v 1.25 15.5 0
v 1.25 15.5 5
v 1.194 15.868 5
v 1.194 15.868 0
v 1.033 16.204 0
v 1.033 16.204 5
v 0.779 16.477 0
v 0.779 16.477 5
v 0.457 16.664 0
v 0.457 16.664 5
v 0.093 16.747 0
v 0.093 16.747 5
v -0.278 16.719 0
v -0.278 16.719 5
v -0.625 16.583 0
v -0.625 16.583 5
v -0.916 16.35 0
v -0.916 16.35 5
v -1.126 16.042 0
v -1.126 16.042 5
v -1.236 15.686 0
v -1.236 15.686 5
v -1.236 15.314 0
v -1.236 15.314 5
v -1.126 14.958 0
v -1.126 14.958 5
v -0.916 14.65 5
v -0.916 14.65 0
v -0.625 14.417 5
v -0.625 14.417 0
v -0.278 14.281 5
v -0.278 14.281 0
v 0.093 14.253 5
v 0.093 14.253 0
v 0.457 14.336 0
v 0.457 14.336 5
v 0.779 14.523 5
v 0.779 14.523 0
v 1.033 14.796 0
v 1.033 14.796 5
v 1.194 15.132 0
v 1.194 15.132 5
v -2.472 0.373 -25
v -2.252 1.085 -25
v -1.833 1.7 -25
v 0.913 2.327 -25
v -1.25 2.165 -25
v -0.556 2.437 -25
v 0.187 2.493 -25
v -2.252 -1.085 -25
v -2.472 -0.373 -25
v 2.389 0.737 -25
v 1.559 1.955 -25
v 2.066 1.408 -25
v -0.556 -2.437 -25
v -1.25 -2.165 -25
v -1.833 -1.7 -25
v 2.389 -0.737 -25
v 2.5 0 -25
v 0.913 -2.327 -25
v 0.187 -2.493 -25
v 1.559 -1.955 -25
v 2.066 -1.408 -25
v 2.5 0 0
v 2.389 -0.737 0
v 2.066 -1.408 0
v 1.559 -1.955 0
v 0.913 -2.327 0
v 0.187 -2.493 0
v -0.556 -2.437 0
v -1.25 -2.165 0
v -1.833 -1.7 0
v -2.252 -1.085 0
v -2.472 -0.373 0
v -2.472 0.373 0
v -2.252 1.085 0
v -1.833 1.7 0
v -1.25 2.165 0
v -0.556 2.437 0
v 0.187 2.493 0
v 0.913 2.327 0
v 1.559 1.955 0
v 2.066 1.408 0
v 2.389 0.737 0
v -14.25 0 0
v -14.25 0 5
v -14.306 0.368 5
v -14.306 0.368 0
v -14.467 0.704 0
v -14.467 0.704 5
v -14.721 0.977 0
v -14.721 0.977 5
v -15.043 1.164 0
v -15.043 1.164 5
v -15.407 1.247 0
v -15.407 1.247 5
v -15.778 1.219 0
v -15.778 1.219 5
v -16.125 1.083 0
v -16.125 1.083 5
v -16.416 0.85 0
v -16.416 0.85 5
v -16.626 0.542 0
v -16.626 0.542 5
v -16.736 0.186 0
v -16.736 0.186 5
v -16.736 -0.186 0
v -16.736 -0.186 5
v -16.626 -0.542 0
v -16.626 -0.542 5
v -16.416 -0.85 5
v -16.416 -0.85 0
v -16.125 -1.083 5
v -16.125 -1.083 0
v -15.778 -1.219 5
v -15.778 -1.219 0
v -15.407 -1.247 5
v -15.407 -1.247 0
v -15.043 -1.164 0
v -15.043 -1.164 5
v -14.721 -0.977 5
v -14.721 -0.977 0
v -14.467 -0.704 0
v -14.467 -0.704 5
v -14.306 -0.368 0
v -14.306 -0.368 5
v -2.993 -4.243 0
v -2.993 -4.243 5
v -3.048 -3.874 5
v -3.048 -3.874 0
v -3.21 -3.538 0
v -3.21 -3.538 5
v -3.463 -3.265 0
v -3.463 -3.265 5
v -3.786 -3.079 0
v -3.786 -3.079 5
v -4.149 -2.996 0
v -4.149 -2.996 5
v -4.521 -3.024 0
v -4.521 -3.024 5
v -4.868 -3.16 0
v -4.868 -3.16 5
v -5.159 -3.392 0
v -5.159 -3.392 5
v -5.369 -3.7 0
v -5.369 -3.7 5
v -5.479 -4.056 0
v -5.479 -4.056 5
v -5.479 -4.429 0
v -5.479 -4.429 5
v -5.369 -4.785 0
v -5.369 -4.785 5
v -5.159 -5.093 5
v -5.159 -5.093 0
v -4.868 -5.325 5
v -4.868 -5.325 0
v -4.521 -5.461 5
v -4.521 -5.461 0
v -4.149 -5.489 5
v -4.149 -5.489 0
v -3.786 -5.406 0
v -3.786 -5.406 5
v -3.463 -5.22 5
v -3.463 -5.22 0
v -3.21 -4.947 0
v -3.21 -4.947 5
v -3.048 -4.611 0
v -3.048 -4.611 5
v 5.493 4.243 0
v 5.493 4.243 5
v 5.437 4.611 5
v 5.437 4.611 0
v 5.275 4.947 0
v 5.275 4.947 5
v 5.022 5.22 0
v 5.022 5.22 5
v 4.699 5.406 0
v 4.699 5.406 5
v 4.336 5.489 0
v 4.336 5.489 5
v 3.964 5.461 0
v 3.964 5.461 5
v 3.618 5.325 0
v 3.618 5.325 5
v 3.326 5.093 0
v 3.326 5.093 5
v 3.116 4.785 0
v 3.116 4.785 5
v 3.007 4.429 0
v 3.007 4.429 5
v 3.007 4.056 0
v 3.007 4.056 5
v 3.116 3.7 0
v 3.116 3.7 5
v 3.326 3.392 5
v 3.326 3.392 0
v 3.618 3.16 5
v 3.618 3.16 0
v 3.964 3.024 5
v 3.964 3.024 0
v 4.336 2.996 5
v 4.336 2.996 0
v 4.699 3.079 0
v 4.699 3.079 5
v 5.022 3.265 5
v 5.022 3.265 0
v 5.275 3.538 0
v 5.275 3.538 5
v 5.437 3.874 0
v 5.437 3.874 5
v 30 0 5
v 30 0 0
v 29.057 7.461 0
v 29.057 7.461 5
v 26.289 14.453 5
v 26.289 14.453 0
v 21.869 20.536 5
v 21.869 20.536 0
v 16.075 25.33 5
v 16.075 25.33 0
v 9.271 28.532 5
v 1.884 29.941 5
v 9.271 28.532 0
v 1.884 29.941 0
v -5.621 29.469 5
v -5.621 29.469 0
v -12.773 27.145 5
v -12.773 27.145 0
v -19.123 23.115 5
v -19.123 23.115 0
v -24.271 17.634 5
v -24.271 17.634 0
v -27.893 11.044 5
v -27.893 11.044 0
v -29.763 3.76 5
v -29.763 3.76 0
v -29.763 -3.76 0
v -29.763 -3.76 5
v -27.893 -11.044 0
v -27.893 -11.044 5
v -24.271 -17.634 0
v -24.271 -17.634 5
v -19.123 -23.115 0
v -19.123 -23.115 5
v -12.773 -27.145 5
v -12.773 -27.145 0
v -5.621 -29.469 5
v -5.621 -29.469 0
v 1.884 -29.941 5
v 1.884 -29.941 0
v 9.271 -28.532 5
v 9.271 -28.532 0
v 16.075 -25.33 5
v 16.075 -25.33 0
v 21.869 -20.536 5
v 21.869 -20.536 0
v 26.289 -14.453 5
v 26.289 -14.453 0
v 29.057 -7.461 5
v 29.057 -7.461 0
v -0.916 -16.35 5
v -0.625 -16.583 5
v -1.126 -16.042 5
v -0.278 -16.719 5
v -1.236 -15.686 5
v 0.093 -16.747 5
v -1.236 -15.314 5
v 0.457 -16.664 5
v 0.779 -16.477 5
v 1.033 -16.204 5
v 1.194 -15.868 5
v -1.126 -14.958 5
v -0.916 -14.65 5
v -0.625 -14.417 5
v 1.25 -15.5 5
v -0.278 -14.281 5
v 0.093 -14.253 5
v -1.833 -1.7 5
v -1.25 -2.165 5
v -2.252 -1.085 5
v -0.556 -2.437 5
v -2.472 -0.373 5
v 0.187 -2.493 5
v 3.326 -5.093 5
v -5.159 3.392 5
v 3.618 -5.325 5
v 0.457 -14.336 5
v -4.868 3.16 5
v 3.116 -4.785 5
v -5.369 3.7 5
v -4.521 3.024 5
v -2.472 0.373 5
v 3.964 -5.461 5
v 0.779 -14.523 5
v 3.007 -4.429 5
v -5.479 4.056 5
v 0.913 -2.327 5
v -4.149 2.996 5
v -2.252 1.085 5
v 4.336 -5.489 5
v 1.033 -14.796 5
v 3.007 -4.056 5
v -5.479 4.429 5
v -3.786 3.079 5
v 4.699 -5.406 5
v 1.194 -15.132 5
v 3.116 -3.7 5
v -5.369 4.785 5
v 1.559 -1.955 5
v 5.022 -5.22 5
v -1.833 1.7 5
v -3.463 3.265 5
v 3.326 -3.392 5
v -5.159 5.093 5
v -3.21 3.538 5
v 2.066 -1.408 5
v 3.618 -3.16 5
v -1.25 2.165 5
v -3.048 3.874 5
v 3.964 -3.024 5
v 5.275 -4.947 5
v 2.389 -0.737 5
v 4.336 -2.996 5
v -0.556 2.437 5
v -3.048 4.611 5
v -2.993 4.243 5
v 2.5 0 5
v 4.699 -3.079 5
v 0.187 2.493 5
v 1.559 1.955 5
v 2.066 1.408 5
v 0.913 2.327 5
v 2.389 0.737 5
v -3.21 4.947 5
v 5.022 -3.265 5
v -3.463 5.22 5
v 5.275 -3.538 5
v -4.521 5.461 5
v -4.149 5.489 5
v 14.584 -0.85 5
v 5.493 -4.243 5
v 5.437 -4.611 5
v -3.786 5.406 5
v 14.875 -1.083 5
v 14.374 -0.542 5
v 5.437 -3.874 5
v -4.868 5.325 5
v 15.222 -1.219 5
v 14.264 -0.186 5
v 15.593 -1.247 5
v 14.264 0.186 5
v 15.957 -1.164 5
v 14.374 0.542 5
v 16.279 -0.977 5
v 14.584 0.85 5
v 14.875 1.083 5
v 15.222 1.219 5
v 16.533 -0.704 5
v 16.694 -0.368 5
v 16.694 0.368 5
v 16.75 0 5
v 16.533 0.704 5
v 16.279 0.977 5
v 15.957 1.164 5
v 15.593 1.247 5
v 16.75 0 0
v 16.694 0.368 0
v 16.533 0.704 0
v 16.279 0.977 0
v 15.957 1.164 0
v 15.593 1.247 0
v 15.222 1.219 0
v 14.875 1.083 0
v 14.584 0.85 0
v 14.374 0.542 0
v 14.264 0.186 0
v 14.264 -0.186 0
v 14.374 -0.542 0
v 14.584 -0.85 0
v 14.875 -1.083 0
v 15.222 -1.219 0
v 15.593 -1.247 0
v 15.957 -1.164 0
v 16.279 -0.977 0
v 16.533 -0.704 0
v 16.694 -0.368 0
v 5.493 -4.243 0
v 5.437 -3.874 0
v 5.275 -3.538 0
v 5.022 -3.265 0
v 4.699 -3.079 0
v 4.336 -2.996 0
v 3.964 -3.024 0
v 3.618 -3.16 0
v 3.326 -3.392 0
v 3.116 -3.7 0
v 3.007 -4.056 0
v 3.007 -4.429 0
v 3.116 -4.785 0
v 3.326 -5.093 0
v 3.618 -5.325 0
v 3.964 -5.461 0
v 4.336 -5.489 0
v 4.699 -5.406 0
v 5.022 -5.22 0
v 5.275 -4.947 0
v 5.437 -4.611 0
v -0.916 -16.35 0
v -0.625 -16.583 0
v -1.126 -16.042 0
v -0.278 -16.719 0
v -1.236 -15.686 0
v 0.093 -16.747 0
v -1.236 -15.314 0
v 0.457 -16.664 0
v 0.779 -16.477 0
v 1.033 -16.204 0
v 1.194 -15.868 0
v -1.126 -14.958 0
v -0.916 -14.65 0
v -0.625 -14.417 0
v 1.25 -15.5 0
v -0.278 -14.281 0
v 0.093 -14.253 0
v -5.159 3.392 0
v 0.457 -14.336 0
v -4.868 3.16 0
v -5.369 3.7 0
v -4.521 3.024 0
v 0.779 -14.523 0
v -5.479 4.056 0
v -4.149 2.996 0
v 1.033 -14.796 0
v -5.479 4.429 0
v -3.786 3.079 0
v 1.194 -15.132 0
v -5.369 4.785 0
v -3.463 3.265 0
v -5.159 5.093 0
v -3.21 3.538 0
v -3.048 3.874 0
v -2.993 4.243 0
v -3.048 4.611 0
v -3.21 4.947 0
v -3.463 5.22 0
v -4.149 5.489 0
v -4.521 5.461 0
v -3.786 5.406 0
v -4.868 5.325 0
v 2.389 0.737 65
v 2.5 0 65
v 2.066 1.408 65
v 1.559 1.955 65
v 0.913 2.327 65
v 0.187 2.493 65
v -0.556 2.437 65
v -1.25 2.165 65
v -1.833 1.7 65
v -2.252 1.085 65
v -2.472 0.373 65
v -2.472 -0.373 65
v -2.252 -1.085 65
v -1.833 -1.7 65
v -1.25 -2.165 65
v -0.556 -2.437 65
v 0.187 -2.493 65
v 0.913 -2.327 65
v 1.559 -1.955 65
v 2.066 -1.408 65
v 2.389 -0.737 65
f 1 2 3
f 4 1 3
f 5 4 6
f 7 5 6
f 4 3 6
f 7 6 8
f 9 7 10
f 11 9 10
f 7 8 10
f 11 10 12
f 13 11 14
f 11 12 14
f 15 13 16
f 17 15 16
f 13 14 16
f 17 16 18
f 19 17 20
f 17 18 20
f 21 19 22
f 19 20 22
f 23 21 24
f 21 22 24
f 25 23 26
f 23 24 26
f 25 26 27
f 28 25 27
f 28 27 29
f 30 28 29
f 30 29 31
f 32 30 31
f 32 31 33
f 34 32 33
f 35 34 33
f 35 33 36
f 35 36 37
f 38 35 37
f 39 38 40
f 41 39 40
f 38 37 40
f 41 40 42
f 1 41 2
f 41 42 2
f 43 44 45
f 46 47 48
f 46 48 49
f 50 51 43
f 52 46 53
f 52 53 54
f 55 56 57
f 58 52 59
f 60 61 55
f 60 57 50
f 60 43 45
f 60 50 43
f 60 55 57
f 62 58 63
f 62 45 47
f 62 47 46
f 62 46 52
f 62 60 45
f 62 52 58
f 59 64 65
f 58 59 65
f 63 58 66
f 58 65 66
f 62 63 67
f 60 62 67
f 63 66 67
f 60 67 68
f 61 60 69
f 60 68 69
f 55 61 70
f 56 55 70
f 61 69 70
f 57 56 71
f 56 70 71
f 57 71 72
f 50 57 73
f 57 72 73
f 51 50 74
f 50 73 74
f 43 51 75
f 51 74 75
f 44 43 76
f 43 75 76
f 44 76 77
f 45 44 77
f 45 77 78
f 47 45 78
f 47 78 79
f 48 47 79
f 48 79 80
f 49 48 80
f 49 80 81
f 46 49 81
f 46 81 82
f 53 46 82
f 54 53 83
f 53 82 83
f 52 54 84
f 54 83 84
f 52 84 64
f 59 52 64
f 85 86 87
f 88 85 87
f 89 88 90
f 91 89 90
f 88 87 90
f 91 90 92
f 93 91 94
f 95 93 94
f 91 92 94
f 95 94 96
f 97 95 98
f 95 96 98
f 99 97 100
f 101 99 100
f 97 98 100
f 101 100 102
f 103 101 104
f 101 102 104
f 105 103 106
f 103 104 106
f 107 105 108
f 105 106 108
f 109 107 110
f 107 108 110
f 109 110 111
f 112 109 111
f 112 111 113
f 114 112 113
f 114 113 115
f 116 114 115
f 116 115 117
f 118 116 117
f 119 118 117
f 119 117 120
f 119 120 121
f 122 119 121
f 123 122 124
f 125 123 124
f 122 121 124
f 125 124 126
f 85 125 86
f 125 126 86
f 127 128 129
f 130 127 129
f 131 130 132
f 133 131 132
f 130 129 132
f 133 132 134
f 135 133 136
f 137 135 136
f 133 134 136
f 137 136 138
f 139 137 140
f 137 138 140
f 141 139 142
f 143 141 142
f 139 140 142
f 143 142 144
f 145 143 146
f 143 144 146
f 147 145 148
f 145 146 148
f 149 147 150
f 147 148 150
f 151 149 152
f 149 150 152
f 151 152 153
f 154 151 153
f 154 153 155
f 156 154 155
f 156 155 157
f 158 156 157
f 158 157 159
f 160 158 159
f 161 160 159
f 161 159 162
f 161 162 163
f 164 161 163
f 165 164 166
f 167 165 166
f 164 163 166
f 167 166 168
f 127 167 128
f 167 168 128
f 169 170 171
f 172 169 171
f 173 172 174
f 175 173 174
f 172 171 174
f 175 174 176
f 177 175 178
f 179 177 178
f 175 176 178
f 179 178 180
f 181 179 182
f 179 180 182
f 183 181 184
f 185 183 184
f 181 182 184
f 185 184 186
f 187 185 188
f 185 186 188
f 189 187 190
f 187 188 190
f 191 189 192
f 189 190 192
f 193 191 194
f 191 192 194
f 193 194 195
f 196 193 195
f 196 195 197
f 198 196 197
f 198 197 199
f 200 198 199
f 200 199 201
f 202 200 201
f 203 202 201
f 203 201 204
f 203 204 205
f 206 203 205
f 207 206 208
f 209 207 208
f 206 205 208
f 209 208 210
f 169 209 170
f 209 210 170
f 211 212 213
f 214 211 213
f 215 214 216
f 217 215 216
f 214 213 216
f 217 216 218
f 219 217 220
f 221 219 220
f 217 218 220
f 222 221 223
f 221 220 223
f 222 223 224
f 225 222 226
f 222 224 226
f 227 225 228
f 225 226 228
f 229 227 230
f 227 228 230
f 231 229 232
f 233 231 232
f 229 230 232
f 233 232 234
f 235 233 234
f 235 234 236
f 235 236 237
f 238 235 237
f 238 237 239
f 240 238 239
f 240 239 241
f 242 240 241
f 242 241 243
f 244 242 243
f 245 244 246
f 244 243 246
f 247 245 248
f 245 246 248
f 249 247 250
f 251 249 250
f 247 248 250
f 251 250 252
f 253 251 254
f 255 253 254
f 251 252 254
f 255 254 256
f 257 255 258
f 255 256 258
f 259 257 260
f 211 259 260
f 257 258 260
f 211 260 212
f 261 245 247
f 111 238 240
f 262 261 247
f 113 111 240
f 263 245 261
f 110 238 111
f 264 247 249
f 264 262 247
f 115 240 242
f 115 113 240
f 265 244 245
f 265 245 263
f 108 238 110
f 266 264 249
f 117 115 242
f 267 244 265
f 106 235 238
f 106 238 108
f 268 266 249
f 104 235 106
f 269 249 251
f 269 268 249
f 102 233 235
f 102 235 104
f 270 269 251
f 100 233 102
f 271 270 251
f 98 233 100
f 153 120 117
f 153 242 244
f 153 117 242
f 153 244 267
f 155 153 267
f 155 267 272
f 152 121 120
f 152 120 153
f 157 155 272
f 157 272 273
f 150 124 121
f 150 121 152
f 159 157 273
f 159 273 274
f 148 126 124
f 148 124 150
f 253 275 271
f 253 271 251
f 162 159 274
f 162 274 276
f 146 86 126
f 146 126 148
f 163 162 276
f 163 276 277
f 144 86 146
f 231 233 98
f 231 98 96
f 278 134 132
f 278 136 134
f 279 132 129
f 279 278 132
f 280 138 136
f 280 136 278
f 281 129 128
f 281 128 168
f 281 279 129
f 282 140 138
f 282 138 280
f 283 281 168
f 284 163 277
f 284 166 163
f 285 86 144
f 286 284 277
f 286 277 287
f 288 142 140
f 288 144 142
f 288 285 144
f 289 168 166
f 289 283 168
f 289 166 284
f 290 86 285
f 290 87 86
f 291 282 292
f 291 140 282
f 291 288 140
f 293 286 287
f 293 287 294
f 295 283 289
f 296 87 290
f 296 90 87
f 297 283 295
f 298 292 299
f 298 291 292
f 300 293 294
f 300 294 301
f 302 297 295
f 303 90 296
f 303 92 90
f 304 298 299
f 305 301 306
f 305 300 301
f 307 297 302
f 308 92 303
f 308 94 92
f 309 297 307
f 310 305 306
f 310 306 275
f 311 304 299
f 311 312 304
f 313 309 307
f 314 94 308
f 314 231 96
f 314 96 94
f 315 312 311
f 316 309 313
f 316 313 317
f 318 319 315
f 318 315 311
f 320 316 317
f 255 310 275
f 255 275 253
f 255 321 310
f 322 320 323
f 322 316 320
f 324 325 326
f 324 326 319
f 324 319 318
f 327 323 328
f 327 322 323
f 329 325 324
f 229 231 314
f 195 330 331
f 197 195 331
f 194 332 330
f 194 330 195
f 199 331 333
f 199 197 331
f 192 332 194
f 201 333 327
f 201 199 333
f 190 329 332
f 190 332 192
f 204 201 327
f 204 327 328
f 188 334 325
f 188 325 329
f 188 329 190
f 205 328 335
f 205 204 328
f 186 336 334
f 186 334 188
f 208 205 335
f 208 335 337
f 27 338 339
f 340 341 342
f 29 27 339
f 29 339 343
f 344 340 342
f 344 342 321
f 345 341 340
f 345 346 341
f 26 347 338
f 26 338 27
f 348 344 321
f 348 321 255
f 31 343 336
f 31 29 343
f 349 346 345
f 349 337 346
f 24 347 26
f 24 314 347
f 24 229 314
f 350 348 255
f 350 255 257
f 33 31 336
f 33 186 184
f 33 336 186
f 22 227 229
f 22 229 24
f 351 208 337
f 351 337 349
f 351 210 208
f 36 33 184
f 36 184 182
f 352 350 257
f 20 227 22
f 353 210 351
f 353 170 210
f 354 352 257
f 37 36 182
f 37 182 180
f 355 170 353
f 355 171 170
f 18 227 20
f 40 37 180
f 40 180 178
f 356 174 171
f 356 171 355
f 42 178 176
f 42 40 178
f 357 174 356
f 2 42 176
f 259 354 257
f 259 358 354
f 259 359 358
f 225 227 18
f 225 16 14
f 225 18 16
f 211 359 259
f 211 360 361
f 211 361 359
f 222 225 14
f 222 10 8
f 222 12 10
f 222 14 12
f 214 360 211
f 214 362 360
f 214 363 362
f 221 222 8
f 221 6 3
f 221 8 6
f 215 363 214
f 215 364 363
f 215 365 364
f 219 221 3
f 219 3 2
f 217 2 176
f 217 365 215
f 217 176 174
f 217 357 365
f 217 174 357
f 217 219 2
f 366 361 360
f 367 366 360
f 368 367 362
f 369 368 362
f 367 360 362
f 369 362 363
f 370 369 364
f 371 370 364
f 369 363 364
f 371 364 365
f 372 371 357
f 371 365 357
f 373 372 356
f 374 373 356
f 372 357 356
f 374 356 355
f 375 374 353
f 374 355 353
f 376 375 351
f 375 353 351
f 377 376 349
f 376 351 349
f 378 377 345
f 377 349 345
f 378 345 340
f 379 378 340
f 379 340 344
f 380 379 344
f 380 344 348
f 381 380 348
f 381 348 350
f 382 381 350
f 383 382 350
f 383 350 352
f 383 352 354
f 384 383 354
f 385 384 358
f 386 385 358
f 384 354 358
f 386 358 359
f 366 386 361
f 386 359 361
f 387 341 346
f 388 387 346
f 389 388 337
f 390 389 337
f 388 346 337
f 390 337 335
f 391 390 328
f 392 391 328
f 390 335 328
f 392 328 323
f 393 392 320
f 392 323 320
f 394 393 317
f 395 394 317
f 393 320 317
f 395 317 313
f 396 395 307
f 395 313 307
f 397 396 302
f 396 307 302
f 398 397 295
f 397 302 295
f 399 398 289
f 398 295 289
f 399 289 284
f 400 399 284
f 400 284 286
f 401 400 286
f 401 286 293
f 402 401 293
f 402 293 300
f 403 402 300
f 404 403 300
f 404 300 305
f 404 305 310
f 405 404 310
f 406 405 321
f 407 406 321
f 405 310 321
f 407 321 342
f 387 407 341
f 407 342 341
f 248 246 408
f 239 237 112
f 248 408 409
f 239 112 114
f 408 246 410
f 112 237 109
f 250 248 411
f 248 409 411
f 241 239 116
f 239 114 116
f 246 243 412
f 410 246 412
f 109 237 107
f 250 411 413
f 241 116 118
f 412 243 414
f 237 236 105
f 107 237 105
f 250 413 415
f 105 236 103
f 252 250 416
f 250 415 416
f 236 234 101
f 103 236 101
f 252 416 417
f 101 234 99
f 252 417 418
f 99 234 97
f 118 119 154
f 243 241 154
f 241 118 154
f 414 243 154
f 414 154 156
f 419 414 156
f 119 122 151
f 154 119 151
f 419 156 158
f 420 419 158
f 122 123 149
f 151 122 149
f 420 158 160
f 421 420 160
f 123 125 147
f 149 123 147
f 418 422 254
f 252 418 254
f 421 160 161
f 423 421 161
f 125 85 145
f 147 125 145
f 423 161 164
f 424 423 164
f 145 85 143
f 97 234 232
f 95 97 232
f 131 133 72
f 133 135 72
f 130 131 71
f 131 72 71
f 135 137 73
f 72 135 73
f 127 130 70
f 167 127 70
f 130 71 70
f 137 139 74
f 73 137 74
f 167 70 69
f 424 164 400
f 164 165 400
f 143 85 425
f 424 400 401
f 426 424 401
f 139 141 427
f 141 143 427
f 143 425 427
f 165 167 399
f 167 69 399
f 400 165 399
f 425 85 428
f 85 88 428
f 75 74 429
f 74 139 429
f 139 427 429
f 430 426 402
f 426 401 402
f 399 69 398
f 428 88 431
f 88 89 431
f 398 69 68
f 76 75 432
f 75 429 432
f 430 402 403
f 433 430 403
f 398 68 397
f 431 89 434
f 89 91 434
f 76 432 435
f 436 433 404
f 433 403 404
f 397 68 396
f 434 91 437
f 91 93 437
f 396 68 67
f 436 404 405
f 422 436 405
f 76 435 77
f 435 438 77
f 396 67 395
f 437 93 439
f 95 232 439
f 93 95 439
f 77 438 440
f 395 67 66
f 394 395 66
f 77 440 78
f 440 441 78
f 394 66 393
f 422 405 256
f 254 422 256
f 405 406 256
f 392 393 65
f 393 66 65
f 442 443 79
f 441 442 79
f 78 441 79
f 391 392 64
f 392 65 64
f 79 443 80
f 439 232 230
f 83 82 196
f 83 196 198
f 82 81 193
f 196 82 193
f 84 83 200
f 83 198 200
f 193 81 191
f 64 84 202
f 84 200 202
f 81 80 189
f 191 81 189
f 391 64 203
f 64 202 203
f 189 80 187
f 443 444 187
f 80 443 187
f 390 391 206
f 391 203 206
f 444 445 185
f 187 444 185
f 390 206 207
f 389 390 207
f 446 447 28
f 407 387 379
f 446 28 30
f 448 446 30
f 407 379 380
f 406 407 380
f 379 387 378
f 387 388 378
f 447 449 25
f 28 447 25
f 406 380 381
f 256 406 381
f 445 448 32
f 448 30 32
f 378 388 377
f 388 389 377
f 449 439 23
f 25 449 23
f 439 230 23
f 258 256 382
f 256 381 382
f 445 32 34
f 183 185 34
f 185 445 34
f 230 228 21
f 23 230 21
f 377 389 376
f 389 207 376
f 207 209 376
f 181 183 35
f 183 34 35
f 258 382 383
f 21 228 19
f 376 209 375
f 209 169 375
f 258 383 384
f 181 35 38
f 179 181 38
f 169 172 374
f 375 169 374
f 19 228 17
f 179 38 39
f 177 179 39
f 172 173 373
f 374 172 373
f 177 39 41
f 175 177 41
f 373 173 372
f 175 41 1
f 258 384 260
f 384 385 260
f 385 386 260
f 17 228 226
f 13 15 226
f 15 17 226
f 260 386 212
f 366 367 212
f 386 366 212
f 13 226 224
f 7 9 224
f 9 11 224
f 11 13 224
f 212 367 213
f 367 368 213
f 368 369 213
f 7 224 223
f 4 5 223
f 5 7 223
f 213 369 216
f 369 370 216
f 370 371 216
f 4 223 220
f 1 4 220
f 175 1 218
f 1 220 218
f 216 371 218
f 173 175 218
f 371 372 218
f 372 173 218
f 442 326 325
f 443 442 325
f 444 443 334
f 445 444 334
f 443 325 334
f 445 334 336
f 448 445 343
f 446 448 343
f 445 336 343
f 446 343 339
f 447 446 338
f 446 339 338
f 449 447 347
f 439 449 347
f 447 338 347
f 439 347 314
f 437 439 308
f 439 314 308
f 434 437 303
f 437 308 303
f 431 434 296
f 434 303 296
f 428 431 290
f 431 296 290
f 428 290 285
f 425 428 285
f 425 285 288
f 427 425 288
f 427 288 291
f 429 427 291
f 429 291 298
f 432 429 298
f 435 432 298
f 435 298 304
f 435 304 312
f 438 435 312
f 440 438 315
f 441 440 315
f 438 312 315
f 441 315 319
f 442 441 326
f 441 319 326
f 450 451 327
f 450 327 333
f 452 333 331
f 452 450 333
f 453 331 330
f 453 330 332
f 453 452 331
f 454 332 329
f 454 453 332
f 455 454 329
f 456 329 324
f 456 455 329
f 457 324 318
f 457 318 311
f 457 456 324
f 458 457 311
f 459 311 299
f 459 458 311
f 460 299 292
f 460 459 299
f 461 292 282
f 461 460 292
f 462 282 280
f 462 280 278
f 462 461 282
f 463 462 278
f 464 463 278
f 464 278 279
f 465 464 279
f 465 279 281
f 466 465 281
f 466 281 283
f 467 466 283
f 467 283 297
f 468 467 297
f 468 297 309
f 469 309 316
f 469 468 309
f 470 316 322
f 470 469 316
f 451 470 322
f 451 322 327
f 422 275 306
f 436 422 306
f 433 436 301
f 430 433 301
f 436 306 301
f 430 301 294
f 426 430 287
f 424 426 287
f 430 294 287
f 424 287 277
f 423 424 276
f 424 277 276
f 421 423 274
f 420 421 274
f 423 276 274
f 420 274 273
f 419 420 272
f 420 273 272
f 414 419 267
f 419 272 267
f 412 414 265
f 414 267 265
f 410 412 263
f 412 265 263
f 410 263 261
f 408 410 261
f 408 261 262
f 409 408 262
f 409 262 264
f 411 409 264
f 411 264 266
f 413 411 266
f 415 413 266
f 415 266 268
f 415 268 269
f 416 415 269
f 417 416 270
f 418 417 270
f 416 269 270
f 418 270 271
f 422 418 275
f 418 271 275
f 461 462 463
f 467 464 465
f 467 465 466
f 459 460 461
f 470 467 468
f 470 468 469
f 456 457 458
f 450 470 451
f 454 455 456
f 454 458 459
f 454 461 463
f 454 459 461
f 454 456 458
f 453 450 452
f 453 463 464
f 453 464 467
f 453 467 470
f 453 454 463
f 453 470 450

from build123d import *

# Parameters (mm, degrees)
SKETCH1_R           = 30
BOSS_EXTRUDE1_DEPTH = 5
SKETCH2_R           = 1.25
CUT_EXTRUDE1_DEPTH  = 5
SKETCH3_R           = 2.5
BOSS_EXTRUDE2_DEPTH = 25
BOSS_EXTRUDE3_START = 60
SKETCH4_R           = 2.5
BOSS_EXTRUDE3_DEPTH = 60


with BuildPart() as part:
    # Sketch1 → Boss-Extrude1 (new body)
    with BuildSketch(Plane.XY):
        Circle(SKETCH1_R)
    extrude(amount=BOSS_EXTRUDE1_DEPTH)

    # Sketch2 → Cut-Extrude1 (cut)
    with BuildSketch(Plane.XY.offset(5)):
        with Locations((0, 15.5)):
            Circle(SKETCH2_R)
        with Locations((15.5, 0)):
            Circle(SKETCH2_R)
        with Locations((0, -15.5)):
            Circle(SKETCH2_R)
        with Locations((-15.5, 0)):
            Circle(SKETCH2_R)
        with Locations((4.242640687, 4.242640687)):
            Circle(SKETCH2_R)
        with Locations((4.242640687, -4.242640687)):
            Circle(SKETCH2_R)
        with Locations((-4.242640687, -4.242640687)):
            Circle(SKETCH2_R)
        with Locations((-4.242640687, 4.242640687)):
            Circle(SKETCH2_R)
    extrude(amount=-CUT_EXTRUDE1_DEPTH, mode=Mode.SUBTRACT)

    # Sketch3 → Boss-Extrude2 (add)
    with BuildSketch(Plane(origin=(0, 0, 0), x_dir=(-1, 0, 0), z_dir=(0, 0, -1))):
        with Locations(Location((0, 0, 0), (0, 0, 180))):
            Circle(SKETCH3_R)
    extrude(amount=BOSS_EXTRUDE2_DEPTH)

    # Sketch4 → Boss-Extrude3 (add)
    with BuildSketch(Plane.XY.offset(5).offset(BOSS_EXTRUDE3_START)):
        Circle(SKETCH4_R)
    extrude(amount=-BOSS_EXTRUDE3_DEPTH)


solid = part.part
